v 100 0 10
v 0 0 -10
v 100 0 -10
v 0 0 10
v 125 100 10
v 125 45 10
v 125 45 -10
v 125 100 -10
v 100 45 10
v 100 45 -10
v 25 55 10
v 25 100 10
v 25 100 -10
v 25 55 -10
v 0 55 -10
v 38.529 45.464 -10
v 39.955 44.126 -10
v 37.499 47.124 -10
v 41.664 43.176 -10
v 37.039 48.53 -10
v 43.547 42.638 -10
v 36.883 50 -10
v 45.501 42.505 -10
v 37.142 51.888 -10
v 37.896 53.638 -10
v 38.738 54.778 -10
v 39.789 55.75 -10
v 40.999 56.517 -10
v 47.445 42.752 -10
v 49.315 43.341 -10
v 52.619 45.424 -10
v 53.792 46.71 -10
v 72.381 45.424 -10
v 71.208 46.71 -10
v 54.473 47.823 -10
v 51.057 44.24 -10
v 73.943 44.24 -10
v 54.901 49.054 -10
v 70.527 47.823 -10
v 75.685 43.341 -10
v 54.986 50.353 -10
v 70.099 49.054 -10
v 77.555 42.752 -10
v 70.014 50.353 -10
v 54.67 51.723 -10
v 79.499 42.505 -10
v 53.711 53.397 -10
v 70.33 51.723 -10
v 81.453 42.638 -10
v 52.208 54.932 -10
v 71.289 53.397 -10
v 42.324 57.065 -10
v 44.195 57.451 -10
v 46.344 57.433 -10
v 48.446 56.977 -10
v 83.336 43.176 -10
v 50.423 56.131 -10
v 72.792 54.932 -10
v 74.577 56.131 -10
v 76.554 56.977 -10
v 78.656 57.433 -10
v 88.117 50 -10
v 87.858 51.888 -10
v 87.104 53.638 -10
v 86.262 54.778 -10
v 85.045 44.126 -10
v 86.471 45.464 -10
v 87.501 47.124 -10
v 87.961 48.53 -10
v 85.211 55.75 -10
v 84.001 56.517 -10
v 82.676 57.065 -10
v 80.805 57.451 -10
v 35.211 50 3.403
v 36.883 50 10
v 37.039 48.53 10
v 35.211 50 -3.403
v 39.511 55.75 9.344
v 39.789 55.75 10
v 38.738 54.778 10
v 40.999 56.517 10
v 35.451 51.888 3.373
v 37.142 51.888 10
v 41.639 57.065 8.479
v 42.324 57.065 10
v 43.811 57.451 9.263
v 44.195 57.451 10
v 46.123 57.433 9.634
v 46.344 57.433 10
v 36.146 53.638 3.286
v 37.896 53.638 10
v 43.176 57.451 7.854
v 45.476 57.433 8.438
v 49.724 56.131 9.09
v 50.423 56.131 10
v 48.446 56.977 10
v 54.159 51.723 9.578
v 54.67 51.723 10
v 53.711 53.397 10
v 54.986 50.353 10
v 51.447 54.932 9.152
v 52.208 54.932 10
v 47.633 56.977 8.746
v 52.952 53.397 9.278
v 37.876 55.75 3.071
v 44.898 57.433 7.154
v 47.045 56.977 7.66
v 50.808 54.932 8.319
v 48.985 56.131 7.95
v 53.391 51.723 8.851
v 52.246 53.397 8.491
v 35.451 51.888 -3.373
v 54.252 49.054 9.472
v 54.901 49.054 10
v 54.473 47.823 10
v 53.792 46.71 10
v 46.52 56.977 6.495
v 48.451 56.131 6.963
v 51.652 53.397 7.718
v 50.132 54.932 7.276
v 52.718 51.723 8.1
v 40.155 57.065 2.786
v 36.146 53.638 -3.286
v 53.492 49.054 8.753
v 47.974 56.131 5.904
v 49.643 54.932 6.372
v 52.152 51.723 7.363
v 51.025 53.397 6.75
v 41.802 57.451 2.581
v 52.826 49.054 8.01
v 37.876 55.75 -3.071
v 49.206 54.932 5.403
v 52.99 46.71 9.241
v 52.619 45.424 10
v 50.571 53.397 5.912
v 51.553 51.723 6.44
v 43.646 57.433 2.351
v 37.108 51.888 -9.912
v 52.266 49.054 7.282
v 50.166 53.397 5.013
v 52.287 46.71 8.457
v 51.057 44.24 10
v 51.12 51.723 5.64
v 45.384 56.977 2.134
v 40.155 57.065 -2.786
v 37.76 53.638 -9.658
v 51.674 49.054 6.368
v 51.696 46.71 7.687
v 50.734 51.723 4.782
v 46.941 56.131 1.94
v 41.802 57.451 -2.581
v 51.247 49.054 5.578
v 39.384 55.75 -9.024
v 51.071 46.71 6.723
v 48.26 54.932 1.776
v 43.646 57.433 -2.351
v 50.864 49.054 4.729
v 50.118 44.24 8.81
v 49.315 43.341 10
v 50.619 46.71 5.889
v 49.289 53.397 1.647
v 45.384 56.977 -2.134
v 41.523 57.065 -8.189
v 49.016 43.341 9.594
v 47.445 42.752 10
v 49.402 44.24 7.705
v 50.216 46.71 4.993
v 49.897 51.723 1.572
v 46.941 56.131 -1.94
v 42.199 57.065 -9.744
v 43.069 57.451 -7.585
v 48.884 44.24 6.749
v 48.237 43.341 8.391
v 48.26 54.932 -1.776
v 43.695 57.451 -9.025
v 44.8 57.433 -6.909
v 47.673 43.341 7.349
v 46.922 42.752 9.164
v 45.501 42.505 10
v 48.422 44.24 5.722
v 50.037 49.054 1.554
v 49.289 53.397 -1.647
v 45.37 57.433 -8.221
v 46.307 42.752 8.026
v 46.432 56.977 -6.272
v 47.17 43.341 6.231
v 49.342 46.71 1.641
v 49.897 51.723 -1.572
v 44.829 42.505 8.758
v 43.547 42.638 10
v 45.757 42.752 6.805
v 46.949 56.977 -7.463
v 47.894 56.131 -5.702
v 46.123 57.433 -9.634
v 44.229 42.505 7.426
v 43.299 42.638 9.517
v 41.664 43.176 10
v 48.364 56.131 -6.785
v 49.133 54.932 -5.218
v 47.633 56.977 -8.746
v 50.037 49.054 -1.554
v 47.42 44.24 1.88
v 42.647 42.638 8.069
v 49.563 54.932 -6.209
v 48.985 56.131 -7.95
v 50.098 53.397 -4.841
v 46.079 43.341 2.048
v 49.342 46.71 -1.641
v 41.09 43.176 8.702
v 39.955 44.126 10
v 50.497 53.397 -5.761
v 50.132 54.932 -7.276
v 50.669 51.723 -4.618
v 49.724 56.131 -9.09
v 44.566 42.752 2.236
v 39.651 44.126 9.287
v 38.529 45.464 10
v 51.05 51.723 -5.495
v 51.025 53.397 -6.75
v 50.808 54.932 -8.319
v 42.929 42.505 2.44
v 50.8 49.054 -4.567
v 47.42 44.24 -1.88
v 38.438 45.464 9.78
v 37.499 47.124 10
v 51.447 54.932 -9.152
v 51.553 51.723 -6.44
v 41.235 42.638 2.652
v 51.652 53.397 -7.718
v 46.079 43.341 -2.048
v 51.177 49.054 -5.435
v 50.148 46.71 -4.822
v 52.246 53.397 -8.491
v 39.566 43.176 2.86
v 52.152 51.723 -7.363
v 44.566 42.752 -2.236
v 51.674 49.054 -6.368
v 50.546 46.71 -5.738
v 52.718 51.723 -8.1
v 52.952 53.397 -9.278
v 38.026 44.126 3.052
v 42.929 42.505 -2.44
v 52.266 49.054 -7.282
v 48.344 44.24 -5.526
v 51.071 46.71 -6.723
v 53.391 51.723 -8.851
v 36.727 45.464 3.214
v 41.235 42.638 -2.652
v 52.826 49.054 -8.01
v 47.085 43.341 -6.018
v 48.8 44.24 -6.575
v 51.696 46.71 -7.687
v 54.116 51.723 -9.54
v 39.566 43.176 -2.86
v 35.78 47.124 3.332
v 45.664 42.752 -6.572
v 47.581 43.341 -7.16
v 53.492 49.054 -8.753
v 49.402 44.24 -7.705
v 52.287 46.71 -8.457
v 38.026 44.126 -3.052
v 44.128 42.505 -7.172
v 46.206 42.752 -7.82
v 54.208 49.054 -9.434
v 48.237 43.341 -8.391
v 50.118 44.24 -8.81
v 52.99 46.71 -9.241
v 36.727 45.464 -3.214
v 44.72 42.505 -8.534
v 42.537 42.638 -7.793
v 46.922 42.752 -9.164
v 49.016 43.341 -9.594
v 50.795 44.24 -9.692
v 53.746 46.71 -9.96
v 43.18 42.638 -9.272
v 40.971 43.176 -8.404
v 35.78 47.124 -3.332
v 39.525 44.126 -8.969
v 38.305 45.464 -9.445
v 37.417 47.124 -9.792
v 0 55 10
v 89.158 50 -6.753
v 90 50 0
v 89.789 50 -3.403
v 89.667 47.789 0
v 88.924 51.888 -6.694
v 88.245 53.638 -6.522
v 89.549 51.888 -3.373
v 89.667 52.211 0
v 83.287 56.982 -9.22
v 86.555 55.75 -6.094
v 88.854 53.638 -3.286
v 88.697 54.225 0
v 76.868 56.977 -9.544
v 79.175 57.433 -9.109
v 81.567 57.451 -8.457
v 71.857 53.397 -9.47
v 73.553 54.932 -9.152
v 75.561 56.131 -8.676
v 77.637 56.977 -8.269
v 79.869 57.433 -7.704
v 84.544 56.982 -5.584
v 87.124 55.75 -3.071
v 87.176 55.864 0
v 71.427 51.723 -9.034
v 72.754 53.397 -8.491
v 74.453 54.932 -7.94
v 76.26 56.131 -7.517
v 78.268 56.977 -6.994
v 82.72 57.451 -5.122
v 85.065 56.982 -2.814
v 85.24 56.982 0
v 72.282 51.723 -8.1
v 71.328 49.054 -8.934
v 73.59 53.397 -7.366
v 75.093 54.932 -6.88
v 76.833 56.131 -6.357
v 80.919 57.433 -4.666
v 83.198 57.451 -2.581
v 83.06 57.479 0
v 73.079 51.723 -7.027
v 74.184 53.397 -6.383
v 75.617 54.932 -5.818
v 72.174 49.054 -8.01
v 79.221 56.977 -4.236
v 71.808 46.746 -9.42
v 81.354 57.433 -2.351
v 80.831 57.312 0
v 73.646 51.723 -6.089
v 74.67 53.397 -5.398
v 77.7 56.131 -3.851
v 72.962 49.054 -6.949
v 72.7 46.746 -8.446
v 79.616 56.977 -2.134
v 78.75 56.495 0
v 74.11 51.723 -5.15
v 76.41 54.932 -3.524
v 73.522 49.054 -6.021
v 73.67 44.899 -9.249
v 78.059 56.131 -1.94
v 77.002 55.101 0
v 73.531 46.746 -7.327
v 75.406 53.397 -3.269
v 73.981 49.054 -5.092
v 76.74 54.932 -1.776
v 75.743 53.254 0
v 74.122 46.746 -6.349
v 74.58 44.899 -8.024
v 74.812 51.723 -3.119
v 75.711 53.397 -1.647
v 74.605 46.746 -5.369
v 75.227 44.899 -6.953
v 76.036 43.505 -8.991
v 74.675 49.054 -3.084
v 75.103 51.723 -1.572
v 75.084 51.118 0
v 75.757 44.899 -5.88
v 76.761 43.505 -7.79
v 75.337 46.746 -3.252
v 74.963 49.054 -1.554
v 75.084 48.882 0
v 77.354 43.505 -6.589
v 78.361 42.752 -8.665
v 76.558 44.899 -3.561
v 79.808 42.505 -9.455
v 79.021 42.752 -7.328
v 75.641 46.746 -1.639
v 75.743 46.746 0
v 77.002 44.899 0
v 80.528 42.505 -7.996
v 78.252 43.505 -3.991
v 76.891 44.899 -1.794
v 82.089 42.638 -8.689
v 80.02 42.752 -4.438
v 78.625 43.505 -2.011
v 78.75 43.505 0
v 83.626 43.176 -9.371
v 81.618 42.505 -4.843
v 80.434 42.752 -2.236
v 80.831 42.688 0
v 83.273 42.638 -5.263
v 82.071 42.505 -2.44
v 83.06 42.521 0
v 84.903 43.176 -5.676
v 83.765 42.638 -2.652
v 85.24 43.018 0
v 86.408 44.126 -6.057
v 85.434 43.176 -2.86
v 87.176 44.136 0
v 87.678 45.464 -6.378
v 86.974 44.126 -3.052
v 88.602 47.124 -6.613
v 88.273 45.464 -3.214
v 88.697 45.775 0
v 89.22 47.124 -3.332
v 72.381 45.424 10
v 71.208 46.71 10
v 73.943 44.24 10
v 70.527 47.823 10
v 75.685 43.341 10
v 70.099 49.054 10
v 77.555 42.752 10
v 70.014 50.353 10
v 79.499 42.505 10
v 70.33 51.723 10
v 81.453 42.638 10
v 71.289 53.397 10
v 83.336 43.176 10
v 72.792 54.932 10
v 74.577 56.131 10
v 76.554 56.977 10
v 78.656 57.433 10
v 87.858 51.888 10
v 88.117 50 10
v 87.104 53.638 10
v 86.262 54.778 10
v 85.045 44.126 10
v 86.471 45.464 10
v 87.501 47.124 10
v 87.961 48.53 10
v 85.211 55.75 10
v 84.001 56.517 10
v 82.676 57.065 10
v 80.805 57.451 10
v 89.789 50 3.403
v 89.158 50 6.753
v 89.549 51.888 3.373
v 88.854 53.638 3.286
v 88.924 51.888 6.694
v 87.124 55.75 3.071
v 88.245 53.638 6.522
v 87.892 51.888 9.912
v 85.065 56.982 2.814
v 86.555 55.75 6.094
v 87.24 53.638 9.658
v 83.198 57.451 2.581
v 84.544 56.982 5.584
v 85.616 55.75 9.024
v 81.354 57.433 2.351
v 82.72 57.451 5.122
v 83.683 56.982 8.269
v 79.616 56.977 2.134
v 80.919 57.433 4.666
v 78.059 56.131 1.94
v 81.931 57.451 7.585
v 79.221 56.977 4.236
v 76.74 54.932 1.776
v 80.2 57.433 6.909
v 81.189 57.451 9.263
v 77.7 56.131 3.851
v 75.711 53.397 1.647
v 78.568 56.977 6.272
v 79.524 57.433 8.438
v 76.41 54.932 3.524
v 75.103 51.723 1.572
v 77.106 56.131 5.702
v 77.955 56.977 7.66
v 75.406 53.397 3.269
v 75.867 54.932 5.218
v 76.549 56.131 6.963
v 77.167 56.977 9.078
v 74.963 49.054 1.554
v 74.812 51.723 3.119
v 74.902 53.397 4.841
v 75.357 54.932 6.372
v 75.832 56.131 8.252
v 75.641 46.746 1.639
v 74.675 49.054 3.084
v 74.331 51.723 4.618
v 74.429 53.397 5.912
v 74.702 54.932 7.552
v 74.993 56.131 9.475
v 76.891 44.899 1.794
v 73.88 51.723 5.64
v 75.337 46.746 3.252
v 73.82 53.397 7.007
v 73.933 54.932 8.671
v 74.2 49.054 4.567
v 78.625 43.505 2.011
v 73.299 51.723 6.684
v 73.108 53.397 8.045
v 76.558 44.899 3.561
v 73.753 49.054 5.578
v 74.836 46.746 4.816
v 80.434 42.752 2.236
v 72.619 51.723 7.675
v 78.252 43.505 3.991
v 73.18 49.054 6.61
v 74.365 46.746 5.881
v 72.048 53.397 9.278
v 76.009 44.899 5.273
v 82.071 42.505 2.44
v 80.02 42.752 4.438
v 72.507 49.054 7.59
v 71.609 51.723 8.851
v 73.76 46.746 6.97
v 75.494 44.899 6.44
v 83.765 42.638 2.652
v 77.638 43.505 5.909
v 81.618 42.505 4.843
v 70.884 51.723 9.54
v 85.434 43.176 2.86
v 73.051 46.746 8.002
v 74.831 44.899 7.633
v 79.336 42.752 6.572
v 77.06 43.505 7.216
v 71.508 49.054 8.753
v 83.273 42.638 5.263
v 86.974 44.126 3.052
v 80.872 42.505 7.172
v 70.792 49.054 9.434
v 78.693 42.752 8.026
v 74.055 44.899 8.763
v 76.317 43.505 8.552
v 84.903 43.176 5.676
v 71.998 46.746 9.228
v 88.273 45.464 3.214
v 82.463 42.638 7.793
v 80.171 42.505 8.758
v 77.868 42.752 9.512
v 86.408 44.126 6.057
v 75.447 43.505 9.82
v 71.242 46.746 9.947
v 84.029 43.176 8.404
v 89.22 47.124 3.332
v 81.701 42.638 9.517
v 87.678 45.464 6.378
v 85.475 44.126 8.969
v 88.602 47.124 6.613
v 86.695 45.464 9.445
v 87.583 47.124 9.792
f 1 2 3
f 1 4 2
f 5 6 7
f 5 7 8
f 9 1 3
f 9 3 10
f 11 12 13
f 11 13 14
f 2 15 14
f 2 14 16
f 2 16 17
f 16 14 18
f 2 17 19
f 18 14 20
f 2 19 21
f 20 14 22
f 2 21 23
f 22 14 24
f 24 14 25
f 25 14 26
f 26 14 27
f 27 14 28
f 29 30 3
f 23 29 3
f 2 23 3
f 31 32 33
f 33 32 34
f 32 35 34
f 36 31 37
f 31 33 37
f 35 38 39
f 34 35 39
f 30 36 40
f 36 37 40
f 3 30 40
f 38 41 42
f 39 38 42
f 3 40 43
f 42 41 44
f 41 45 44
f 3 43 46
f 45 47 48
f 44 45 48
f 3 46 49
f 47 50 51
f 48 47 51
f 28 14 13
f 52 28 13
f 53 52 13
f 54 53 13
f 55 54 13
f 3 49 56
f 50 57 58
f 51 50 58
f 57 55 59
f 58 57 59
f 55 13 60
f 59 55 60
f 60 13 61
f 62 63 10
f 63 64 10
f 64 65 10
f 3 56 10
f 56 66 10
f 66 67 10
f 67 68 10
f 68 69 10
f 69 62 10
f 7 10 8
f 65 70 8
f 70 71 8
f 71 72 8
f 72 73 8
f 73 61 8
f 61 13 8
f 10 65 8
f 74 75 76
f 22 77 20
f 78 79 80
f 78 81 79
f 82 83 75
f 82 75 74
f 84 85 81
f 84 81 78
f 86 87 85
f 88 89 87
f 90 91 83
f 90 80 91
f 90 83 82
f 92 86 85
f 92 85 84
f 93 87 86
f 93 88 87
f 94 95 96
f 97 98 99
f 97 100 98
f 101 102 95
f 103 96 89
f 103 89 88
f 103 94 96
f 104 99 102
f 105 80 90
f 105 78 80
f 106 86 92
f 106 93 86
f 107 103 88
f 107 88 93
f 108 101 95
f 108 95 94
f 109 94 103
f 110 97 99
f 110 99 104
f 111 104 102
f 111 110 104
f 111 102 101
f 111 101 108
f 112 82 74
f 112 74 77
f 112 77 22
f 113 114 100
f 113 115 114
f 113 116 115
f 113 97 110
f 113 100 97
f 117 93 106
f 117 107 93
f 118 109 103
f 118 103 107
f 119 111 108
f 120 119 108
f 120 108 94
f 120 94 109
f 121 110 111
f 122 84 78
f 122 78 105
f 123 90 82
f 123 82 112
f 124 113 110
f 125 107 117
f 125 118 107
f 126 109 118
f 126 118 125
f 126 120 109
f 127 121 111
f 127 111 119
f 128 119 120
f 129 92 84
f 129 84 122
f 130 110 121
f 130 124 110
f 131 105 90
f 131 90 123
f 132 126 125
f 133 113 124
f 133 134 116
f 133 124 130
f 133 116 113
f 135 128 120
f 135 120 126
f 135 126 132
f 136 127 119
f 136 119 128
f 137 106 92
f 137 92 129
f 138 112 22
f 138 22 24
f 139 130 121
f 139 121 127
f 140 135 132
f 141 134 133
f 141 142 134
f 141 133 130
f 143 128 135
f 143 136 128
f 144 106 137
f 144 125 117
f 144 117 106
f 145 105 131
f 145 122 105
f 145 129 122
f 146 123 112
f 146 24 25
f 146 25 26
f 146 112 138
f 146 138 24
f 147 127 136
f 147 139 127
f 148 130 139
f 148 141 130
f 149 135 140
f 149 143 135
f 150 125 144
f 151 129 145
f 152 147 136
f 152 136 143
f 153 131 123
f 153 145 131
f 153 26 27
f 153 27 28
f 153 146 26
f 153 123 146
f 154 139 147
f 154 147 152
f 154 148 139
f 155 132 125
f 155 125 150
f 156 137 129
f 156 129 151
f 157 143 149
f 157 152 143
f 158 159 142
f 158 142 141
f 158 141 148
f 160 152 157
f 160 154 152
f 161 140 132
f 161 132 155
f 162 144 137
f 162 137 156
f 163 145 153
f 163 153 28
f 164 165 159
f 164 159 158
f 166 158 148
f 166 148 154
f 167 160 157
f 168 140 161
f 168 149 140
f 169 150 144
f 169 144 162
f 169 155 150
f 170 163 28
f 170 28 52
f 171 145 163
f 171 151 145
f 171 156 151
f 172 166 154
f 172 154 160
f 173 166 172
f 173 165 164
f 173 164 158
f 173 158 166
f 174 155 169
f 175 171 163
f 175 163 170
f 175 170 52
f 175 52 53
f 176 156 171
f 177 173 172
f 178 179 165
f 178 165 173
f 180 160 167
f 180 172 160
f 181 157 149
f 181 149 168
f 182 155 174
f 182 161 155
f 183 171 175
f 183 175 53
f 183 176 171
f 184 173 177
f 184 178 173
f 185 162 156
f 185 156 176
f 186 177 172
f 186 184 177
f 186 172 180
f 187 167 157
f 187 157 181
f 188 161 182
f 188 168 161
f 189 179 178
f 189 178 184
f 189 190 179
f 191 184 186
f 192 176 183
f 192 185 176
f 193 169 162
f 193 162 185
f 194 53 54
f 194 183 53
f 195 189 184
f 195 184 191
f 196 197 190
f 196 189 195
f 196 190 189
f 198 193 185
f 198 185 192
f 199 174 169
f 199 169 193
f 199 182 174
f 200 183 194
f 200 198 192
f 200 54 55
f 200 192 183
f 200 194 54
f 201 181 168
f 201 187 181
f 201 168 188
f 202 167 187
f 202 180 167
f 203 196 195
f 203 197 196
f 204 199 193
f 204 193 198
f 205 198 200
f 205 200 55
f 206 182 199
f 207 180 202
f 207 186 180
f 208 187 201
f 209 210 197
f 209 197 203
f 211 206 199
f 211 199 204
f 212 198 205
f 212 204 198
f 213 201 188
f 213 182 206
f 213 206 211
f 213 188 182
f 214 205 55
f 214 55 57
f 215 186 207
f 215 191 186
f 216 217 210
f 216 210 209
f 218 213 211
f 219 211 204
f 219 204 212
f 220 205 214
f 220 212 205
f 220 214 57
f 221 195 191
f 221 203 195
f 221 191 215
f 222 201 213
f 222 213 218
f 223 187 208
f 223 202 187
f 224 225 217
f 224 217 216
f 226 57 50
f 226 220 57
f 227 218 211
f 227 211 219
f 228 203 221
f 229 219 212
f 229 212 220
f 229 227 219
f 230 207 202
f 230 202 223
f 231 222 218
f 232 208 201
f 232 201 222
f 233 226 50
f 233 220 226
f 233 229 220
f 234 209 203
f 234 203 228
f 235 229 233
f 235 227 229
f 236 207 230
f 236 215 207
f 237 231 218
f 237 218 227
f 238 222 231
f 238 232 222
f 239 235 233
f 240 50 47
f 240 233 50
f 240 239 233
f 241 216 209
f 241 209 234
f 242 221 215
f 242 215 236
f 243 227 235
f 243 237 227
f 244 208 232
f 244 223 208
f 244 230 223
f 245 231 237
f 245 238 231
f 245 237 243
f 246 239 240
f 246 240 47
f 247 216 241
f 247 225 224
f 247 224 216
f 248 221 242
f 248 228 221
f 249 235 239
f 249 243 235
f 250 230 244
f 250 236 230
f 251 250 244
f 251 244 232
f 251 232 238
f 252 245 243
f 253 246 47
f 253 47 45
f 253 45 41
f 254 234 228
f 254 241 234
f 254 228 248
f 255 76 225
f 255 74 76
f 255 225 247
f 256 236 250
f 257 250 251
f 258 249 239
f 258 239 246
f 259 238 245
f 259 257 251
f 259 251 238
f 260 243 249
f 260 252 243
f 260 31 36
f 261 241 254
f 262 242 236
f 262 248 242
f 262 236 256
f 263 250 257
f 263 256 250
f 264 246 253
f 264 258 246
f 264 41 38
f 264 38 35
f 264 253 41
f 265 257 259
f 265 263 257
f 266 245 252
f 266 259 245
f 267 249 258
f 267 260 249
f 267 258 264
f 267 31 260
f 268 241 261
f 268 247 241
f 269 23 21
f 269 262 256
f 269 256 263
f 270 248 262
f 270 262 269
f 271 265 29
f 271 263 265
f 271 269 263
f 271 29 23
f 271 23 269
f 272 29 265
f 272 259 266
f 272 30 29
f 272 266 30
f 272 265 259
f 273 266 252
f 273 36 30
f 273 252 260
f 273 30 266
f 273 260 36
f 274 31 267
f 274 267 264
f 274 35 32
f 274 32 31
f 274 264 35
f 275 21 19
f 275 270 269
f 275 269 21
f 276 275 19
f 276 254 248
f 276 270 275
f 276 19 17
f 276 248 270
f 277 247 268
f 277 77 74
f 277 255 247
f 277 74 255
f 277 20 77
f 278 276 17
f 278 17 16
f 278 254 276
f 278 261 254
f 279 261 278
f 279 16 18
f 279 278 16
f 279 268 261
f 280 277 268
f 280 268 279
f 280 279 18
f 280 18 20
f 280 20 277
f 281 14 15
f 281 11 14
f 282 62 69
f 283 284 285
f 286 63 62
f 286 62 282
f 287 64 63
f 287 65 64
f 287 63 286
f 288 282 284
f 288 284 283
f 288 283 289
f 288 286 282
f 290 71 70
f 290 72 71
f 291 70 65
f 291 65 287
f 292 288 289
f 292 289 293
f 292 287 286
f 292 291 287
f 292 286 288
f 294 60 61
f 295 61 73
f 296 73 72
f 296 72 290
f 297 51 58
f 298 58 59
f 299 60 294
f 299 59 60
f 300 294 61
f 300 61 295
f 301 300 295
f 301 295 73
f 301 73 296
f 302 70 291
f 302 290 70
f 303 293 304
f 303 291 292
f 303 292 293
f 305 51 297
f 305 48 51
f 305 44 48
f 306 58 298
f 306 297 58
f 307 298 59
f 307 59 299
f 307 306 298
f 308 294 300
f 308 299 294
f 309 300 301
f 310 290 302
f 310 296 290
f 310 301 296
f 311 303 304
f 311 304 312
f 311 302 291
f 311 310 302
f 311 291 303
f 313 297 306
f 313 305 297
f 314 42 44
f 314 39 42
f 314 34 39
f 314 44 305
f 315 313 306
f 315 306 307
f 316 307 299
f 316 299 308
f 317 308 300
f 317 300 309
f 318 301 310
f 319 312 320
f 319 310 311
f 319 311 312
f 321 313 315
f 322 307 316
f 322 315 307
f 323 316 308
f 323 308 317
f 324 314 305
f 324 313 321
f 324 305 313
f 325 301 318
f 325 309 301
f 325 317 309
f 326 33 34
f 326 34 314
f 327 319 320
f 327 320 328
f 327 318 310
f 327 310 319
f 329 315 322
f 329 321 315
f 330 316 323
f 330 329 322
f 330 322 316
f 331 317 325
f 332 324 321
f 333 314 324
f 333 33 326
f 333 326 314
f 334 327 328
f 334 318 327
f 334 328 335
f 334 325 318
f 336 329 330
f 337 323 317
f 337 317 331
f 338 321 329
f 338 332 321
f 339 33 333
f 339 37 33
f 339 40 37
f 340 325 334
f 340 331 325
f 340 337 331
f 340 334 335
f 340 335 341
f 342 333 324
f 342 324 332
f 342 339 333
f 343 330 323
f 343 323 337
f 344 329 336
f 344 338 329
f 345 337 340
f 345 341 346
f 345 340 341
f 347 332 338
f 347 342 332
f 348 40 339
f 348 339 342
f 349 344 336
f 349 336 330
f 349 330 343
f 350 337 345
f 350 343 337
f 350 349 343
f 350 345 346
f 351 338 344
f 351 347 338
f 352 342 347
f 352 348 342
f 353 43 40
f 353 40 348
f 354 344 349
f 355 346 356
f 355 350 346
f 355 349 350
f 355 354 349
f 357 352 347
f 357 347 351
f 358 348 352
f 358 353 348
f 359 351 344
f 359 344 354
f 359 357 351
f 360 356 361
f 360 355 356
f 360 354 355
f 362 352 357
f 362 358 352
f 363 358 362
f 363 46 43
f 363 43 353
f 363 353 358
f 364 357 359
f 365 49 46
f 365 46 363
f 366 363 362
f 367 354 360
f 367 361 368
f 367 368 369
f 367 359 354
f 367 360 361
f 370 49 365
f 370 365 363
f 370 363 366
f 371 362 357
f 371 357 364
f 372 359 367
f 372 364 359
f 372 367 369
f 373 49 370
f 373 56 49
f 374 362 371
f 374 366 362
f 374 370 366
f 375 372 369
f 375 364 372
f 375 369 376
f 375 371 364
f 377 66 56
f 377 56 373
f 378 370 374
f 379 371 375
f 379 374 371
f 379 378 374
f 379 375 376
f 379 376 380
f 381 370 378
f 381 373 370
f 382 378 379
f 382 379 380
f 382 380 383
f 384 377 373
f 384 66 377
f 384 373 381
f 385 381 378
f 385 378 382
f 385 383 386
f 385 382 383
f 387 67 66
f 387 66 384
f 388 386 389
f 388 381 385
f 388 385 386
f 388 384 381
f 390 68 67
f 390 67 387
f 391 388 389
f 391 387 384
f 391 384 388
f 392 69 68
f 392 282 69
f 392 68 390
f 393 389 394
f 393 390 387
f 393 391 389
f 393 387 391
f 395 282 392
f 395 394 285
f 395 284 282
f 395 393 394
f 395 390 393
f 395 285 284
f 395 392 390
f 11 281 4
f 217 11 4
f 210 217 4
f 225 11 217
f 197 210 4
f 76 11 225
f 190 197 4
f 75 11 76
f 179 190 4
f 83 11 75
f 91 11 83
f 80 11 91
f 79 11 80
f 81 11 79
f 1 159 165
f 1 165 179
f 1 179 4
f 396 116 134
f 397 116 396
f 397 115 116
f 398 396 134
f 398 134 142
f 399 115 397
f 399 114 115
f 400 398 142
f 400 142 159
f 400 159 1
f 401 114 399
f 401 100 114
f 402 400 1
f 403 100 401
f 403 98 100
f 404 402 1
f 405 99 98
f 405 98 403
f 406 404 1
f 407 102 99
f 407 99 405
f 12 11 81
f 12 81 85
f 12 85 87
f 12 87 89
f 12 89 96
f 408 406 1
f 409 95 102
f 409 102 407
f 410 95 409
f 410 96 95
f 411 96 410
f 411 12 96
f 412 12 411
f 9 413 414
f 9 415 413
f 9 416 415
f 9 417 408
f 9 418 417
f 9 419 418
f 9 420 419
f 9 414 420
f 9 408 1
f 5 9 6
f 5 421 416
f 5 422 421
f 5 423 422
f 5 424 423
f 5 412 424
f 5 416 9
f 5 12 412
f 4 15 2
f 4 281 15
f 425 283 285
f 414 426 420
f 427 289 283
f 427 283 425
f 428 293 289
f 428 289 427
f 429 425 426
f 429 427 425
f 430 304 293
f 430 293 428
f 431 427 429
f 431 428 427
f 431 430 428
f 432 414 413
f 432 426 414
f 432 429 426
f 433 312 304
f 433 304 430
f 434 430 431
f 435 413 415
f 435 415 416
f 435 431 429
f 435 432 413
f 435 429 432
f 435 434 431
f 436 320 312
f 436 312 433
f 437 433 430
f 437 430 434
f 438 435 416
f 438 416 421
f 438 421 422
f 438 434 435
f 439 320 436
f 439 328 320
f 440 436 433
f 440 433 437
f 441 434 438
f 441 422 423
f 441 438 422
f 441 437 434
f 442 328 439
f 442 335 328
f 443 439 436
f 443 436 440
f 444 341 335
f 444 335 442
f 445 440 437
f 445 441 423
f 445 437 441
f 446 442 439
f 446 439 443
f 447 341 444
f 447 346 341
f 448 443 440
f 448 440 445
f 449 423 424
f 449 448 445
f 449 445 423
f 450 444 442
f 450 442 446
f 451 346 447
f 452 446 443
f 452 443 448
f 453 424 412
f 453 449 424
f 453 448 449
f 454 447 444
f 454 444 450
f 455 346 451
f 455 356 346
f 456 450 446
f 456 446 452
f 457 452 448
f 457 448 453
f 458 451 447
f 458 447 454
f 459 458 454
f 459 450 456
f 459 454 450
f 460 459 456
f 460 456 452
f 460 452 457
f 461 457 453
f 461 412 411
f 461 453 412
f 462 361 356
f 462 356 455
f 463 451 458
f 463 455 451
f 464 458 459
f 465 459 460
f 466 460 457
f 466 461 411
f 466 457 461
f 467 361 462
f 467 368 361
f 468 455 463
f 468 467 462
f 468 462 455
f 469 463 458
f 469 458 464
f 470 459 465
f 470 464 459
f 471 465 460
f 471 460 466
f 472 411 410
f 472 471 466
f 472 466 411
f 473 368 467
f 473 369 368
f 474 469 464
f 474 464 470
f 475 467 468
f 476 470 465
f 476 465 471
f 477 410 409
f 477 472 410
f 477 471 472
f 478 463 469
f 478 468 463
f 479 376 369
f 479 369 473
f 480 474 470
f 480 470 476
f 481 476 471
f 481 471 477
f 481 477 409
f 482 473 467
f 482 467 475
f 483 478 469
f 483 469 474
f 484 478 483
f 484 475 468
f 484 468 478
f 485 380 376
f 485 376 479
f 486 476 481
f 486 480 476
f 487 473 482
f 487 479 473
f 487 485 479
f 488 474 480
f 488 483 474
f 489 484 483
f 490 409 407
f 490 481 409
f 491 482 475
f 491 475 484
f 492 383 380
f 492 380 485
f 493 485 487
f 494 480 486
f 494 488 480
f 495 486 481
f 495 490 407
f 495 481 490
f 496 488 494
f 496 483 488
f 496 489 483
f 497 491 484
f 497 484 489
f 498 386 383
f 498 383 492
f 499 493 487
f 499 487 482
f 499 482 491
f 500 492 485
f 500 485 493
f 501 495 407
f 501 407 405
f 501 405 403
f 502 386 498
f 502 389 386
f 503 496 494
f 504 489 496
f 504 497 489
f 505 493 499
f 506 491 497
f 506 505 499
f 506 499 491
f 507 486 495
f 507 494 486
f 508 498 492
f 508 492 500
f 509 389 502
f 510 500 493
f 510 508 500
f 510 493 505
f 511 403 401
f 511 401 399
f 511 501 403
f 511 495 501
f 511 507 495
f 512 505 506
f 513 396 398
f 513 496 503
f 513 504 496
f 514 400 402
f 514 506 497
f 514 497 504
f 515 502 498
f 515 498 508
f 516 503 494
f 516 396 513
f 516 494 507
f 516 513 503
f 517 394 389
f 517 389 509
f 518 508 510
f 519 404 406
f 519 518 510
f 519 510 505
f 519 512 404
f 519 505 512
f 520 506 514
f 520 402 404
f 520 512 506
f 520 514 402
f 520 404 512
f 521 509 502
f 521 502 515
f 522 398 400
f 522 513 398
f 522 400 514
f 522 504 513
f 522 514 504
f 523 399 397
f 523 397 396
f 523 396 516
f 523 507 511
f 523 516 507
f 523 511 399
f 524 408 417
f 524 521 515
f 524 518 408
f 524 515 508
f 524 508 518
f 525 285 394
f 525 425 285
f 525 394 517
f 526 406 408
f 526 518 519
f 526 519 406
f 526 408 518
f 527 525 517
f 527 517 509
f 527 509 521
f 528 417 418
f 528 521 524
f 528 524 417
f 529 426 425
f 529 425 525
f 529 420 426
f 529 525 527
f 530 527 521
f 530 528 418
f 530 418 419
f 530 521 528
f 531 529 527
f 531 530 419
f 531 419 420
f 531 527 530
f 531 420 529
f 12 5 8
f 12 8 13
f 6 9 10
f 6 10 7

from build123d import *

# Parameters (mm, degrees)
BOSS_EXTRUDE1_DEPTH      = 10
BOSS_EXTRUDE1_DEPTH_BACK = 10
SKETCH2_R                = 7.5


with BuildPart() as part:
    # Sketch1 → Boss-Extrude1 (new, two sides: drawn at the far end of the back side and taken through both)
    with BuildSketch(Plane.XY.offset(-BOSS_EXTRUDE1_DEPTH_BACK)):
        Polygon((0, 0), (100, 0), (100, 45), (125, 45), (125, 100), (25, 100), (25, 55), (0, 55), align=None)
    extrude(amount=BOSS_EXTRUDE1_DEPTH + BOSS_EXTRUDE1_DEPTH_BACK)

    # Sketch2 → Cut-Revolve2 (revolve, cut)
    with BuildSketch(Plane.XY):
        with Locations((82.5, 50)):
            Circle(SKETCH2_R)
    revolve(axis=Axis((62.5, 50.212189842, 0), (0, -1, 0)), mode=Mode.SUBTRACT)


solid = part.part
